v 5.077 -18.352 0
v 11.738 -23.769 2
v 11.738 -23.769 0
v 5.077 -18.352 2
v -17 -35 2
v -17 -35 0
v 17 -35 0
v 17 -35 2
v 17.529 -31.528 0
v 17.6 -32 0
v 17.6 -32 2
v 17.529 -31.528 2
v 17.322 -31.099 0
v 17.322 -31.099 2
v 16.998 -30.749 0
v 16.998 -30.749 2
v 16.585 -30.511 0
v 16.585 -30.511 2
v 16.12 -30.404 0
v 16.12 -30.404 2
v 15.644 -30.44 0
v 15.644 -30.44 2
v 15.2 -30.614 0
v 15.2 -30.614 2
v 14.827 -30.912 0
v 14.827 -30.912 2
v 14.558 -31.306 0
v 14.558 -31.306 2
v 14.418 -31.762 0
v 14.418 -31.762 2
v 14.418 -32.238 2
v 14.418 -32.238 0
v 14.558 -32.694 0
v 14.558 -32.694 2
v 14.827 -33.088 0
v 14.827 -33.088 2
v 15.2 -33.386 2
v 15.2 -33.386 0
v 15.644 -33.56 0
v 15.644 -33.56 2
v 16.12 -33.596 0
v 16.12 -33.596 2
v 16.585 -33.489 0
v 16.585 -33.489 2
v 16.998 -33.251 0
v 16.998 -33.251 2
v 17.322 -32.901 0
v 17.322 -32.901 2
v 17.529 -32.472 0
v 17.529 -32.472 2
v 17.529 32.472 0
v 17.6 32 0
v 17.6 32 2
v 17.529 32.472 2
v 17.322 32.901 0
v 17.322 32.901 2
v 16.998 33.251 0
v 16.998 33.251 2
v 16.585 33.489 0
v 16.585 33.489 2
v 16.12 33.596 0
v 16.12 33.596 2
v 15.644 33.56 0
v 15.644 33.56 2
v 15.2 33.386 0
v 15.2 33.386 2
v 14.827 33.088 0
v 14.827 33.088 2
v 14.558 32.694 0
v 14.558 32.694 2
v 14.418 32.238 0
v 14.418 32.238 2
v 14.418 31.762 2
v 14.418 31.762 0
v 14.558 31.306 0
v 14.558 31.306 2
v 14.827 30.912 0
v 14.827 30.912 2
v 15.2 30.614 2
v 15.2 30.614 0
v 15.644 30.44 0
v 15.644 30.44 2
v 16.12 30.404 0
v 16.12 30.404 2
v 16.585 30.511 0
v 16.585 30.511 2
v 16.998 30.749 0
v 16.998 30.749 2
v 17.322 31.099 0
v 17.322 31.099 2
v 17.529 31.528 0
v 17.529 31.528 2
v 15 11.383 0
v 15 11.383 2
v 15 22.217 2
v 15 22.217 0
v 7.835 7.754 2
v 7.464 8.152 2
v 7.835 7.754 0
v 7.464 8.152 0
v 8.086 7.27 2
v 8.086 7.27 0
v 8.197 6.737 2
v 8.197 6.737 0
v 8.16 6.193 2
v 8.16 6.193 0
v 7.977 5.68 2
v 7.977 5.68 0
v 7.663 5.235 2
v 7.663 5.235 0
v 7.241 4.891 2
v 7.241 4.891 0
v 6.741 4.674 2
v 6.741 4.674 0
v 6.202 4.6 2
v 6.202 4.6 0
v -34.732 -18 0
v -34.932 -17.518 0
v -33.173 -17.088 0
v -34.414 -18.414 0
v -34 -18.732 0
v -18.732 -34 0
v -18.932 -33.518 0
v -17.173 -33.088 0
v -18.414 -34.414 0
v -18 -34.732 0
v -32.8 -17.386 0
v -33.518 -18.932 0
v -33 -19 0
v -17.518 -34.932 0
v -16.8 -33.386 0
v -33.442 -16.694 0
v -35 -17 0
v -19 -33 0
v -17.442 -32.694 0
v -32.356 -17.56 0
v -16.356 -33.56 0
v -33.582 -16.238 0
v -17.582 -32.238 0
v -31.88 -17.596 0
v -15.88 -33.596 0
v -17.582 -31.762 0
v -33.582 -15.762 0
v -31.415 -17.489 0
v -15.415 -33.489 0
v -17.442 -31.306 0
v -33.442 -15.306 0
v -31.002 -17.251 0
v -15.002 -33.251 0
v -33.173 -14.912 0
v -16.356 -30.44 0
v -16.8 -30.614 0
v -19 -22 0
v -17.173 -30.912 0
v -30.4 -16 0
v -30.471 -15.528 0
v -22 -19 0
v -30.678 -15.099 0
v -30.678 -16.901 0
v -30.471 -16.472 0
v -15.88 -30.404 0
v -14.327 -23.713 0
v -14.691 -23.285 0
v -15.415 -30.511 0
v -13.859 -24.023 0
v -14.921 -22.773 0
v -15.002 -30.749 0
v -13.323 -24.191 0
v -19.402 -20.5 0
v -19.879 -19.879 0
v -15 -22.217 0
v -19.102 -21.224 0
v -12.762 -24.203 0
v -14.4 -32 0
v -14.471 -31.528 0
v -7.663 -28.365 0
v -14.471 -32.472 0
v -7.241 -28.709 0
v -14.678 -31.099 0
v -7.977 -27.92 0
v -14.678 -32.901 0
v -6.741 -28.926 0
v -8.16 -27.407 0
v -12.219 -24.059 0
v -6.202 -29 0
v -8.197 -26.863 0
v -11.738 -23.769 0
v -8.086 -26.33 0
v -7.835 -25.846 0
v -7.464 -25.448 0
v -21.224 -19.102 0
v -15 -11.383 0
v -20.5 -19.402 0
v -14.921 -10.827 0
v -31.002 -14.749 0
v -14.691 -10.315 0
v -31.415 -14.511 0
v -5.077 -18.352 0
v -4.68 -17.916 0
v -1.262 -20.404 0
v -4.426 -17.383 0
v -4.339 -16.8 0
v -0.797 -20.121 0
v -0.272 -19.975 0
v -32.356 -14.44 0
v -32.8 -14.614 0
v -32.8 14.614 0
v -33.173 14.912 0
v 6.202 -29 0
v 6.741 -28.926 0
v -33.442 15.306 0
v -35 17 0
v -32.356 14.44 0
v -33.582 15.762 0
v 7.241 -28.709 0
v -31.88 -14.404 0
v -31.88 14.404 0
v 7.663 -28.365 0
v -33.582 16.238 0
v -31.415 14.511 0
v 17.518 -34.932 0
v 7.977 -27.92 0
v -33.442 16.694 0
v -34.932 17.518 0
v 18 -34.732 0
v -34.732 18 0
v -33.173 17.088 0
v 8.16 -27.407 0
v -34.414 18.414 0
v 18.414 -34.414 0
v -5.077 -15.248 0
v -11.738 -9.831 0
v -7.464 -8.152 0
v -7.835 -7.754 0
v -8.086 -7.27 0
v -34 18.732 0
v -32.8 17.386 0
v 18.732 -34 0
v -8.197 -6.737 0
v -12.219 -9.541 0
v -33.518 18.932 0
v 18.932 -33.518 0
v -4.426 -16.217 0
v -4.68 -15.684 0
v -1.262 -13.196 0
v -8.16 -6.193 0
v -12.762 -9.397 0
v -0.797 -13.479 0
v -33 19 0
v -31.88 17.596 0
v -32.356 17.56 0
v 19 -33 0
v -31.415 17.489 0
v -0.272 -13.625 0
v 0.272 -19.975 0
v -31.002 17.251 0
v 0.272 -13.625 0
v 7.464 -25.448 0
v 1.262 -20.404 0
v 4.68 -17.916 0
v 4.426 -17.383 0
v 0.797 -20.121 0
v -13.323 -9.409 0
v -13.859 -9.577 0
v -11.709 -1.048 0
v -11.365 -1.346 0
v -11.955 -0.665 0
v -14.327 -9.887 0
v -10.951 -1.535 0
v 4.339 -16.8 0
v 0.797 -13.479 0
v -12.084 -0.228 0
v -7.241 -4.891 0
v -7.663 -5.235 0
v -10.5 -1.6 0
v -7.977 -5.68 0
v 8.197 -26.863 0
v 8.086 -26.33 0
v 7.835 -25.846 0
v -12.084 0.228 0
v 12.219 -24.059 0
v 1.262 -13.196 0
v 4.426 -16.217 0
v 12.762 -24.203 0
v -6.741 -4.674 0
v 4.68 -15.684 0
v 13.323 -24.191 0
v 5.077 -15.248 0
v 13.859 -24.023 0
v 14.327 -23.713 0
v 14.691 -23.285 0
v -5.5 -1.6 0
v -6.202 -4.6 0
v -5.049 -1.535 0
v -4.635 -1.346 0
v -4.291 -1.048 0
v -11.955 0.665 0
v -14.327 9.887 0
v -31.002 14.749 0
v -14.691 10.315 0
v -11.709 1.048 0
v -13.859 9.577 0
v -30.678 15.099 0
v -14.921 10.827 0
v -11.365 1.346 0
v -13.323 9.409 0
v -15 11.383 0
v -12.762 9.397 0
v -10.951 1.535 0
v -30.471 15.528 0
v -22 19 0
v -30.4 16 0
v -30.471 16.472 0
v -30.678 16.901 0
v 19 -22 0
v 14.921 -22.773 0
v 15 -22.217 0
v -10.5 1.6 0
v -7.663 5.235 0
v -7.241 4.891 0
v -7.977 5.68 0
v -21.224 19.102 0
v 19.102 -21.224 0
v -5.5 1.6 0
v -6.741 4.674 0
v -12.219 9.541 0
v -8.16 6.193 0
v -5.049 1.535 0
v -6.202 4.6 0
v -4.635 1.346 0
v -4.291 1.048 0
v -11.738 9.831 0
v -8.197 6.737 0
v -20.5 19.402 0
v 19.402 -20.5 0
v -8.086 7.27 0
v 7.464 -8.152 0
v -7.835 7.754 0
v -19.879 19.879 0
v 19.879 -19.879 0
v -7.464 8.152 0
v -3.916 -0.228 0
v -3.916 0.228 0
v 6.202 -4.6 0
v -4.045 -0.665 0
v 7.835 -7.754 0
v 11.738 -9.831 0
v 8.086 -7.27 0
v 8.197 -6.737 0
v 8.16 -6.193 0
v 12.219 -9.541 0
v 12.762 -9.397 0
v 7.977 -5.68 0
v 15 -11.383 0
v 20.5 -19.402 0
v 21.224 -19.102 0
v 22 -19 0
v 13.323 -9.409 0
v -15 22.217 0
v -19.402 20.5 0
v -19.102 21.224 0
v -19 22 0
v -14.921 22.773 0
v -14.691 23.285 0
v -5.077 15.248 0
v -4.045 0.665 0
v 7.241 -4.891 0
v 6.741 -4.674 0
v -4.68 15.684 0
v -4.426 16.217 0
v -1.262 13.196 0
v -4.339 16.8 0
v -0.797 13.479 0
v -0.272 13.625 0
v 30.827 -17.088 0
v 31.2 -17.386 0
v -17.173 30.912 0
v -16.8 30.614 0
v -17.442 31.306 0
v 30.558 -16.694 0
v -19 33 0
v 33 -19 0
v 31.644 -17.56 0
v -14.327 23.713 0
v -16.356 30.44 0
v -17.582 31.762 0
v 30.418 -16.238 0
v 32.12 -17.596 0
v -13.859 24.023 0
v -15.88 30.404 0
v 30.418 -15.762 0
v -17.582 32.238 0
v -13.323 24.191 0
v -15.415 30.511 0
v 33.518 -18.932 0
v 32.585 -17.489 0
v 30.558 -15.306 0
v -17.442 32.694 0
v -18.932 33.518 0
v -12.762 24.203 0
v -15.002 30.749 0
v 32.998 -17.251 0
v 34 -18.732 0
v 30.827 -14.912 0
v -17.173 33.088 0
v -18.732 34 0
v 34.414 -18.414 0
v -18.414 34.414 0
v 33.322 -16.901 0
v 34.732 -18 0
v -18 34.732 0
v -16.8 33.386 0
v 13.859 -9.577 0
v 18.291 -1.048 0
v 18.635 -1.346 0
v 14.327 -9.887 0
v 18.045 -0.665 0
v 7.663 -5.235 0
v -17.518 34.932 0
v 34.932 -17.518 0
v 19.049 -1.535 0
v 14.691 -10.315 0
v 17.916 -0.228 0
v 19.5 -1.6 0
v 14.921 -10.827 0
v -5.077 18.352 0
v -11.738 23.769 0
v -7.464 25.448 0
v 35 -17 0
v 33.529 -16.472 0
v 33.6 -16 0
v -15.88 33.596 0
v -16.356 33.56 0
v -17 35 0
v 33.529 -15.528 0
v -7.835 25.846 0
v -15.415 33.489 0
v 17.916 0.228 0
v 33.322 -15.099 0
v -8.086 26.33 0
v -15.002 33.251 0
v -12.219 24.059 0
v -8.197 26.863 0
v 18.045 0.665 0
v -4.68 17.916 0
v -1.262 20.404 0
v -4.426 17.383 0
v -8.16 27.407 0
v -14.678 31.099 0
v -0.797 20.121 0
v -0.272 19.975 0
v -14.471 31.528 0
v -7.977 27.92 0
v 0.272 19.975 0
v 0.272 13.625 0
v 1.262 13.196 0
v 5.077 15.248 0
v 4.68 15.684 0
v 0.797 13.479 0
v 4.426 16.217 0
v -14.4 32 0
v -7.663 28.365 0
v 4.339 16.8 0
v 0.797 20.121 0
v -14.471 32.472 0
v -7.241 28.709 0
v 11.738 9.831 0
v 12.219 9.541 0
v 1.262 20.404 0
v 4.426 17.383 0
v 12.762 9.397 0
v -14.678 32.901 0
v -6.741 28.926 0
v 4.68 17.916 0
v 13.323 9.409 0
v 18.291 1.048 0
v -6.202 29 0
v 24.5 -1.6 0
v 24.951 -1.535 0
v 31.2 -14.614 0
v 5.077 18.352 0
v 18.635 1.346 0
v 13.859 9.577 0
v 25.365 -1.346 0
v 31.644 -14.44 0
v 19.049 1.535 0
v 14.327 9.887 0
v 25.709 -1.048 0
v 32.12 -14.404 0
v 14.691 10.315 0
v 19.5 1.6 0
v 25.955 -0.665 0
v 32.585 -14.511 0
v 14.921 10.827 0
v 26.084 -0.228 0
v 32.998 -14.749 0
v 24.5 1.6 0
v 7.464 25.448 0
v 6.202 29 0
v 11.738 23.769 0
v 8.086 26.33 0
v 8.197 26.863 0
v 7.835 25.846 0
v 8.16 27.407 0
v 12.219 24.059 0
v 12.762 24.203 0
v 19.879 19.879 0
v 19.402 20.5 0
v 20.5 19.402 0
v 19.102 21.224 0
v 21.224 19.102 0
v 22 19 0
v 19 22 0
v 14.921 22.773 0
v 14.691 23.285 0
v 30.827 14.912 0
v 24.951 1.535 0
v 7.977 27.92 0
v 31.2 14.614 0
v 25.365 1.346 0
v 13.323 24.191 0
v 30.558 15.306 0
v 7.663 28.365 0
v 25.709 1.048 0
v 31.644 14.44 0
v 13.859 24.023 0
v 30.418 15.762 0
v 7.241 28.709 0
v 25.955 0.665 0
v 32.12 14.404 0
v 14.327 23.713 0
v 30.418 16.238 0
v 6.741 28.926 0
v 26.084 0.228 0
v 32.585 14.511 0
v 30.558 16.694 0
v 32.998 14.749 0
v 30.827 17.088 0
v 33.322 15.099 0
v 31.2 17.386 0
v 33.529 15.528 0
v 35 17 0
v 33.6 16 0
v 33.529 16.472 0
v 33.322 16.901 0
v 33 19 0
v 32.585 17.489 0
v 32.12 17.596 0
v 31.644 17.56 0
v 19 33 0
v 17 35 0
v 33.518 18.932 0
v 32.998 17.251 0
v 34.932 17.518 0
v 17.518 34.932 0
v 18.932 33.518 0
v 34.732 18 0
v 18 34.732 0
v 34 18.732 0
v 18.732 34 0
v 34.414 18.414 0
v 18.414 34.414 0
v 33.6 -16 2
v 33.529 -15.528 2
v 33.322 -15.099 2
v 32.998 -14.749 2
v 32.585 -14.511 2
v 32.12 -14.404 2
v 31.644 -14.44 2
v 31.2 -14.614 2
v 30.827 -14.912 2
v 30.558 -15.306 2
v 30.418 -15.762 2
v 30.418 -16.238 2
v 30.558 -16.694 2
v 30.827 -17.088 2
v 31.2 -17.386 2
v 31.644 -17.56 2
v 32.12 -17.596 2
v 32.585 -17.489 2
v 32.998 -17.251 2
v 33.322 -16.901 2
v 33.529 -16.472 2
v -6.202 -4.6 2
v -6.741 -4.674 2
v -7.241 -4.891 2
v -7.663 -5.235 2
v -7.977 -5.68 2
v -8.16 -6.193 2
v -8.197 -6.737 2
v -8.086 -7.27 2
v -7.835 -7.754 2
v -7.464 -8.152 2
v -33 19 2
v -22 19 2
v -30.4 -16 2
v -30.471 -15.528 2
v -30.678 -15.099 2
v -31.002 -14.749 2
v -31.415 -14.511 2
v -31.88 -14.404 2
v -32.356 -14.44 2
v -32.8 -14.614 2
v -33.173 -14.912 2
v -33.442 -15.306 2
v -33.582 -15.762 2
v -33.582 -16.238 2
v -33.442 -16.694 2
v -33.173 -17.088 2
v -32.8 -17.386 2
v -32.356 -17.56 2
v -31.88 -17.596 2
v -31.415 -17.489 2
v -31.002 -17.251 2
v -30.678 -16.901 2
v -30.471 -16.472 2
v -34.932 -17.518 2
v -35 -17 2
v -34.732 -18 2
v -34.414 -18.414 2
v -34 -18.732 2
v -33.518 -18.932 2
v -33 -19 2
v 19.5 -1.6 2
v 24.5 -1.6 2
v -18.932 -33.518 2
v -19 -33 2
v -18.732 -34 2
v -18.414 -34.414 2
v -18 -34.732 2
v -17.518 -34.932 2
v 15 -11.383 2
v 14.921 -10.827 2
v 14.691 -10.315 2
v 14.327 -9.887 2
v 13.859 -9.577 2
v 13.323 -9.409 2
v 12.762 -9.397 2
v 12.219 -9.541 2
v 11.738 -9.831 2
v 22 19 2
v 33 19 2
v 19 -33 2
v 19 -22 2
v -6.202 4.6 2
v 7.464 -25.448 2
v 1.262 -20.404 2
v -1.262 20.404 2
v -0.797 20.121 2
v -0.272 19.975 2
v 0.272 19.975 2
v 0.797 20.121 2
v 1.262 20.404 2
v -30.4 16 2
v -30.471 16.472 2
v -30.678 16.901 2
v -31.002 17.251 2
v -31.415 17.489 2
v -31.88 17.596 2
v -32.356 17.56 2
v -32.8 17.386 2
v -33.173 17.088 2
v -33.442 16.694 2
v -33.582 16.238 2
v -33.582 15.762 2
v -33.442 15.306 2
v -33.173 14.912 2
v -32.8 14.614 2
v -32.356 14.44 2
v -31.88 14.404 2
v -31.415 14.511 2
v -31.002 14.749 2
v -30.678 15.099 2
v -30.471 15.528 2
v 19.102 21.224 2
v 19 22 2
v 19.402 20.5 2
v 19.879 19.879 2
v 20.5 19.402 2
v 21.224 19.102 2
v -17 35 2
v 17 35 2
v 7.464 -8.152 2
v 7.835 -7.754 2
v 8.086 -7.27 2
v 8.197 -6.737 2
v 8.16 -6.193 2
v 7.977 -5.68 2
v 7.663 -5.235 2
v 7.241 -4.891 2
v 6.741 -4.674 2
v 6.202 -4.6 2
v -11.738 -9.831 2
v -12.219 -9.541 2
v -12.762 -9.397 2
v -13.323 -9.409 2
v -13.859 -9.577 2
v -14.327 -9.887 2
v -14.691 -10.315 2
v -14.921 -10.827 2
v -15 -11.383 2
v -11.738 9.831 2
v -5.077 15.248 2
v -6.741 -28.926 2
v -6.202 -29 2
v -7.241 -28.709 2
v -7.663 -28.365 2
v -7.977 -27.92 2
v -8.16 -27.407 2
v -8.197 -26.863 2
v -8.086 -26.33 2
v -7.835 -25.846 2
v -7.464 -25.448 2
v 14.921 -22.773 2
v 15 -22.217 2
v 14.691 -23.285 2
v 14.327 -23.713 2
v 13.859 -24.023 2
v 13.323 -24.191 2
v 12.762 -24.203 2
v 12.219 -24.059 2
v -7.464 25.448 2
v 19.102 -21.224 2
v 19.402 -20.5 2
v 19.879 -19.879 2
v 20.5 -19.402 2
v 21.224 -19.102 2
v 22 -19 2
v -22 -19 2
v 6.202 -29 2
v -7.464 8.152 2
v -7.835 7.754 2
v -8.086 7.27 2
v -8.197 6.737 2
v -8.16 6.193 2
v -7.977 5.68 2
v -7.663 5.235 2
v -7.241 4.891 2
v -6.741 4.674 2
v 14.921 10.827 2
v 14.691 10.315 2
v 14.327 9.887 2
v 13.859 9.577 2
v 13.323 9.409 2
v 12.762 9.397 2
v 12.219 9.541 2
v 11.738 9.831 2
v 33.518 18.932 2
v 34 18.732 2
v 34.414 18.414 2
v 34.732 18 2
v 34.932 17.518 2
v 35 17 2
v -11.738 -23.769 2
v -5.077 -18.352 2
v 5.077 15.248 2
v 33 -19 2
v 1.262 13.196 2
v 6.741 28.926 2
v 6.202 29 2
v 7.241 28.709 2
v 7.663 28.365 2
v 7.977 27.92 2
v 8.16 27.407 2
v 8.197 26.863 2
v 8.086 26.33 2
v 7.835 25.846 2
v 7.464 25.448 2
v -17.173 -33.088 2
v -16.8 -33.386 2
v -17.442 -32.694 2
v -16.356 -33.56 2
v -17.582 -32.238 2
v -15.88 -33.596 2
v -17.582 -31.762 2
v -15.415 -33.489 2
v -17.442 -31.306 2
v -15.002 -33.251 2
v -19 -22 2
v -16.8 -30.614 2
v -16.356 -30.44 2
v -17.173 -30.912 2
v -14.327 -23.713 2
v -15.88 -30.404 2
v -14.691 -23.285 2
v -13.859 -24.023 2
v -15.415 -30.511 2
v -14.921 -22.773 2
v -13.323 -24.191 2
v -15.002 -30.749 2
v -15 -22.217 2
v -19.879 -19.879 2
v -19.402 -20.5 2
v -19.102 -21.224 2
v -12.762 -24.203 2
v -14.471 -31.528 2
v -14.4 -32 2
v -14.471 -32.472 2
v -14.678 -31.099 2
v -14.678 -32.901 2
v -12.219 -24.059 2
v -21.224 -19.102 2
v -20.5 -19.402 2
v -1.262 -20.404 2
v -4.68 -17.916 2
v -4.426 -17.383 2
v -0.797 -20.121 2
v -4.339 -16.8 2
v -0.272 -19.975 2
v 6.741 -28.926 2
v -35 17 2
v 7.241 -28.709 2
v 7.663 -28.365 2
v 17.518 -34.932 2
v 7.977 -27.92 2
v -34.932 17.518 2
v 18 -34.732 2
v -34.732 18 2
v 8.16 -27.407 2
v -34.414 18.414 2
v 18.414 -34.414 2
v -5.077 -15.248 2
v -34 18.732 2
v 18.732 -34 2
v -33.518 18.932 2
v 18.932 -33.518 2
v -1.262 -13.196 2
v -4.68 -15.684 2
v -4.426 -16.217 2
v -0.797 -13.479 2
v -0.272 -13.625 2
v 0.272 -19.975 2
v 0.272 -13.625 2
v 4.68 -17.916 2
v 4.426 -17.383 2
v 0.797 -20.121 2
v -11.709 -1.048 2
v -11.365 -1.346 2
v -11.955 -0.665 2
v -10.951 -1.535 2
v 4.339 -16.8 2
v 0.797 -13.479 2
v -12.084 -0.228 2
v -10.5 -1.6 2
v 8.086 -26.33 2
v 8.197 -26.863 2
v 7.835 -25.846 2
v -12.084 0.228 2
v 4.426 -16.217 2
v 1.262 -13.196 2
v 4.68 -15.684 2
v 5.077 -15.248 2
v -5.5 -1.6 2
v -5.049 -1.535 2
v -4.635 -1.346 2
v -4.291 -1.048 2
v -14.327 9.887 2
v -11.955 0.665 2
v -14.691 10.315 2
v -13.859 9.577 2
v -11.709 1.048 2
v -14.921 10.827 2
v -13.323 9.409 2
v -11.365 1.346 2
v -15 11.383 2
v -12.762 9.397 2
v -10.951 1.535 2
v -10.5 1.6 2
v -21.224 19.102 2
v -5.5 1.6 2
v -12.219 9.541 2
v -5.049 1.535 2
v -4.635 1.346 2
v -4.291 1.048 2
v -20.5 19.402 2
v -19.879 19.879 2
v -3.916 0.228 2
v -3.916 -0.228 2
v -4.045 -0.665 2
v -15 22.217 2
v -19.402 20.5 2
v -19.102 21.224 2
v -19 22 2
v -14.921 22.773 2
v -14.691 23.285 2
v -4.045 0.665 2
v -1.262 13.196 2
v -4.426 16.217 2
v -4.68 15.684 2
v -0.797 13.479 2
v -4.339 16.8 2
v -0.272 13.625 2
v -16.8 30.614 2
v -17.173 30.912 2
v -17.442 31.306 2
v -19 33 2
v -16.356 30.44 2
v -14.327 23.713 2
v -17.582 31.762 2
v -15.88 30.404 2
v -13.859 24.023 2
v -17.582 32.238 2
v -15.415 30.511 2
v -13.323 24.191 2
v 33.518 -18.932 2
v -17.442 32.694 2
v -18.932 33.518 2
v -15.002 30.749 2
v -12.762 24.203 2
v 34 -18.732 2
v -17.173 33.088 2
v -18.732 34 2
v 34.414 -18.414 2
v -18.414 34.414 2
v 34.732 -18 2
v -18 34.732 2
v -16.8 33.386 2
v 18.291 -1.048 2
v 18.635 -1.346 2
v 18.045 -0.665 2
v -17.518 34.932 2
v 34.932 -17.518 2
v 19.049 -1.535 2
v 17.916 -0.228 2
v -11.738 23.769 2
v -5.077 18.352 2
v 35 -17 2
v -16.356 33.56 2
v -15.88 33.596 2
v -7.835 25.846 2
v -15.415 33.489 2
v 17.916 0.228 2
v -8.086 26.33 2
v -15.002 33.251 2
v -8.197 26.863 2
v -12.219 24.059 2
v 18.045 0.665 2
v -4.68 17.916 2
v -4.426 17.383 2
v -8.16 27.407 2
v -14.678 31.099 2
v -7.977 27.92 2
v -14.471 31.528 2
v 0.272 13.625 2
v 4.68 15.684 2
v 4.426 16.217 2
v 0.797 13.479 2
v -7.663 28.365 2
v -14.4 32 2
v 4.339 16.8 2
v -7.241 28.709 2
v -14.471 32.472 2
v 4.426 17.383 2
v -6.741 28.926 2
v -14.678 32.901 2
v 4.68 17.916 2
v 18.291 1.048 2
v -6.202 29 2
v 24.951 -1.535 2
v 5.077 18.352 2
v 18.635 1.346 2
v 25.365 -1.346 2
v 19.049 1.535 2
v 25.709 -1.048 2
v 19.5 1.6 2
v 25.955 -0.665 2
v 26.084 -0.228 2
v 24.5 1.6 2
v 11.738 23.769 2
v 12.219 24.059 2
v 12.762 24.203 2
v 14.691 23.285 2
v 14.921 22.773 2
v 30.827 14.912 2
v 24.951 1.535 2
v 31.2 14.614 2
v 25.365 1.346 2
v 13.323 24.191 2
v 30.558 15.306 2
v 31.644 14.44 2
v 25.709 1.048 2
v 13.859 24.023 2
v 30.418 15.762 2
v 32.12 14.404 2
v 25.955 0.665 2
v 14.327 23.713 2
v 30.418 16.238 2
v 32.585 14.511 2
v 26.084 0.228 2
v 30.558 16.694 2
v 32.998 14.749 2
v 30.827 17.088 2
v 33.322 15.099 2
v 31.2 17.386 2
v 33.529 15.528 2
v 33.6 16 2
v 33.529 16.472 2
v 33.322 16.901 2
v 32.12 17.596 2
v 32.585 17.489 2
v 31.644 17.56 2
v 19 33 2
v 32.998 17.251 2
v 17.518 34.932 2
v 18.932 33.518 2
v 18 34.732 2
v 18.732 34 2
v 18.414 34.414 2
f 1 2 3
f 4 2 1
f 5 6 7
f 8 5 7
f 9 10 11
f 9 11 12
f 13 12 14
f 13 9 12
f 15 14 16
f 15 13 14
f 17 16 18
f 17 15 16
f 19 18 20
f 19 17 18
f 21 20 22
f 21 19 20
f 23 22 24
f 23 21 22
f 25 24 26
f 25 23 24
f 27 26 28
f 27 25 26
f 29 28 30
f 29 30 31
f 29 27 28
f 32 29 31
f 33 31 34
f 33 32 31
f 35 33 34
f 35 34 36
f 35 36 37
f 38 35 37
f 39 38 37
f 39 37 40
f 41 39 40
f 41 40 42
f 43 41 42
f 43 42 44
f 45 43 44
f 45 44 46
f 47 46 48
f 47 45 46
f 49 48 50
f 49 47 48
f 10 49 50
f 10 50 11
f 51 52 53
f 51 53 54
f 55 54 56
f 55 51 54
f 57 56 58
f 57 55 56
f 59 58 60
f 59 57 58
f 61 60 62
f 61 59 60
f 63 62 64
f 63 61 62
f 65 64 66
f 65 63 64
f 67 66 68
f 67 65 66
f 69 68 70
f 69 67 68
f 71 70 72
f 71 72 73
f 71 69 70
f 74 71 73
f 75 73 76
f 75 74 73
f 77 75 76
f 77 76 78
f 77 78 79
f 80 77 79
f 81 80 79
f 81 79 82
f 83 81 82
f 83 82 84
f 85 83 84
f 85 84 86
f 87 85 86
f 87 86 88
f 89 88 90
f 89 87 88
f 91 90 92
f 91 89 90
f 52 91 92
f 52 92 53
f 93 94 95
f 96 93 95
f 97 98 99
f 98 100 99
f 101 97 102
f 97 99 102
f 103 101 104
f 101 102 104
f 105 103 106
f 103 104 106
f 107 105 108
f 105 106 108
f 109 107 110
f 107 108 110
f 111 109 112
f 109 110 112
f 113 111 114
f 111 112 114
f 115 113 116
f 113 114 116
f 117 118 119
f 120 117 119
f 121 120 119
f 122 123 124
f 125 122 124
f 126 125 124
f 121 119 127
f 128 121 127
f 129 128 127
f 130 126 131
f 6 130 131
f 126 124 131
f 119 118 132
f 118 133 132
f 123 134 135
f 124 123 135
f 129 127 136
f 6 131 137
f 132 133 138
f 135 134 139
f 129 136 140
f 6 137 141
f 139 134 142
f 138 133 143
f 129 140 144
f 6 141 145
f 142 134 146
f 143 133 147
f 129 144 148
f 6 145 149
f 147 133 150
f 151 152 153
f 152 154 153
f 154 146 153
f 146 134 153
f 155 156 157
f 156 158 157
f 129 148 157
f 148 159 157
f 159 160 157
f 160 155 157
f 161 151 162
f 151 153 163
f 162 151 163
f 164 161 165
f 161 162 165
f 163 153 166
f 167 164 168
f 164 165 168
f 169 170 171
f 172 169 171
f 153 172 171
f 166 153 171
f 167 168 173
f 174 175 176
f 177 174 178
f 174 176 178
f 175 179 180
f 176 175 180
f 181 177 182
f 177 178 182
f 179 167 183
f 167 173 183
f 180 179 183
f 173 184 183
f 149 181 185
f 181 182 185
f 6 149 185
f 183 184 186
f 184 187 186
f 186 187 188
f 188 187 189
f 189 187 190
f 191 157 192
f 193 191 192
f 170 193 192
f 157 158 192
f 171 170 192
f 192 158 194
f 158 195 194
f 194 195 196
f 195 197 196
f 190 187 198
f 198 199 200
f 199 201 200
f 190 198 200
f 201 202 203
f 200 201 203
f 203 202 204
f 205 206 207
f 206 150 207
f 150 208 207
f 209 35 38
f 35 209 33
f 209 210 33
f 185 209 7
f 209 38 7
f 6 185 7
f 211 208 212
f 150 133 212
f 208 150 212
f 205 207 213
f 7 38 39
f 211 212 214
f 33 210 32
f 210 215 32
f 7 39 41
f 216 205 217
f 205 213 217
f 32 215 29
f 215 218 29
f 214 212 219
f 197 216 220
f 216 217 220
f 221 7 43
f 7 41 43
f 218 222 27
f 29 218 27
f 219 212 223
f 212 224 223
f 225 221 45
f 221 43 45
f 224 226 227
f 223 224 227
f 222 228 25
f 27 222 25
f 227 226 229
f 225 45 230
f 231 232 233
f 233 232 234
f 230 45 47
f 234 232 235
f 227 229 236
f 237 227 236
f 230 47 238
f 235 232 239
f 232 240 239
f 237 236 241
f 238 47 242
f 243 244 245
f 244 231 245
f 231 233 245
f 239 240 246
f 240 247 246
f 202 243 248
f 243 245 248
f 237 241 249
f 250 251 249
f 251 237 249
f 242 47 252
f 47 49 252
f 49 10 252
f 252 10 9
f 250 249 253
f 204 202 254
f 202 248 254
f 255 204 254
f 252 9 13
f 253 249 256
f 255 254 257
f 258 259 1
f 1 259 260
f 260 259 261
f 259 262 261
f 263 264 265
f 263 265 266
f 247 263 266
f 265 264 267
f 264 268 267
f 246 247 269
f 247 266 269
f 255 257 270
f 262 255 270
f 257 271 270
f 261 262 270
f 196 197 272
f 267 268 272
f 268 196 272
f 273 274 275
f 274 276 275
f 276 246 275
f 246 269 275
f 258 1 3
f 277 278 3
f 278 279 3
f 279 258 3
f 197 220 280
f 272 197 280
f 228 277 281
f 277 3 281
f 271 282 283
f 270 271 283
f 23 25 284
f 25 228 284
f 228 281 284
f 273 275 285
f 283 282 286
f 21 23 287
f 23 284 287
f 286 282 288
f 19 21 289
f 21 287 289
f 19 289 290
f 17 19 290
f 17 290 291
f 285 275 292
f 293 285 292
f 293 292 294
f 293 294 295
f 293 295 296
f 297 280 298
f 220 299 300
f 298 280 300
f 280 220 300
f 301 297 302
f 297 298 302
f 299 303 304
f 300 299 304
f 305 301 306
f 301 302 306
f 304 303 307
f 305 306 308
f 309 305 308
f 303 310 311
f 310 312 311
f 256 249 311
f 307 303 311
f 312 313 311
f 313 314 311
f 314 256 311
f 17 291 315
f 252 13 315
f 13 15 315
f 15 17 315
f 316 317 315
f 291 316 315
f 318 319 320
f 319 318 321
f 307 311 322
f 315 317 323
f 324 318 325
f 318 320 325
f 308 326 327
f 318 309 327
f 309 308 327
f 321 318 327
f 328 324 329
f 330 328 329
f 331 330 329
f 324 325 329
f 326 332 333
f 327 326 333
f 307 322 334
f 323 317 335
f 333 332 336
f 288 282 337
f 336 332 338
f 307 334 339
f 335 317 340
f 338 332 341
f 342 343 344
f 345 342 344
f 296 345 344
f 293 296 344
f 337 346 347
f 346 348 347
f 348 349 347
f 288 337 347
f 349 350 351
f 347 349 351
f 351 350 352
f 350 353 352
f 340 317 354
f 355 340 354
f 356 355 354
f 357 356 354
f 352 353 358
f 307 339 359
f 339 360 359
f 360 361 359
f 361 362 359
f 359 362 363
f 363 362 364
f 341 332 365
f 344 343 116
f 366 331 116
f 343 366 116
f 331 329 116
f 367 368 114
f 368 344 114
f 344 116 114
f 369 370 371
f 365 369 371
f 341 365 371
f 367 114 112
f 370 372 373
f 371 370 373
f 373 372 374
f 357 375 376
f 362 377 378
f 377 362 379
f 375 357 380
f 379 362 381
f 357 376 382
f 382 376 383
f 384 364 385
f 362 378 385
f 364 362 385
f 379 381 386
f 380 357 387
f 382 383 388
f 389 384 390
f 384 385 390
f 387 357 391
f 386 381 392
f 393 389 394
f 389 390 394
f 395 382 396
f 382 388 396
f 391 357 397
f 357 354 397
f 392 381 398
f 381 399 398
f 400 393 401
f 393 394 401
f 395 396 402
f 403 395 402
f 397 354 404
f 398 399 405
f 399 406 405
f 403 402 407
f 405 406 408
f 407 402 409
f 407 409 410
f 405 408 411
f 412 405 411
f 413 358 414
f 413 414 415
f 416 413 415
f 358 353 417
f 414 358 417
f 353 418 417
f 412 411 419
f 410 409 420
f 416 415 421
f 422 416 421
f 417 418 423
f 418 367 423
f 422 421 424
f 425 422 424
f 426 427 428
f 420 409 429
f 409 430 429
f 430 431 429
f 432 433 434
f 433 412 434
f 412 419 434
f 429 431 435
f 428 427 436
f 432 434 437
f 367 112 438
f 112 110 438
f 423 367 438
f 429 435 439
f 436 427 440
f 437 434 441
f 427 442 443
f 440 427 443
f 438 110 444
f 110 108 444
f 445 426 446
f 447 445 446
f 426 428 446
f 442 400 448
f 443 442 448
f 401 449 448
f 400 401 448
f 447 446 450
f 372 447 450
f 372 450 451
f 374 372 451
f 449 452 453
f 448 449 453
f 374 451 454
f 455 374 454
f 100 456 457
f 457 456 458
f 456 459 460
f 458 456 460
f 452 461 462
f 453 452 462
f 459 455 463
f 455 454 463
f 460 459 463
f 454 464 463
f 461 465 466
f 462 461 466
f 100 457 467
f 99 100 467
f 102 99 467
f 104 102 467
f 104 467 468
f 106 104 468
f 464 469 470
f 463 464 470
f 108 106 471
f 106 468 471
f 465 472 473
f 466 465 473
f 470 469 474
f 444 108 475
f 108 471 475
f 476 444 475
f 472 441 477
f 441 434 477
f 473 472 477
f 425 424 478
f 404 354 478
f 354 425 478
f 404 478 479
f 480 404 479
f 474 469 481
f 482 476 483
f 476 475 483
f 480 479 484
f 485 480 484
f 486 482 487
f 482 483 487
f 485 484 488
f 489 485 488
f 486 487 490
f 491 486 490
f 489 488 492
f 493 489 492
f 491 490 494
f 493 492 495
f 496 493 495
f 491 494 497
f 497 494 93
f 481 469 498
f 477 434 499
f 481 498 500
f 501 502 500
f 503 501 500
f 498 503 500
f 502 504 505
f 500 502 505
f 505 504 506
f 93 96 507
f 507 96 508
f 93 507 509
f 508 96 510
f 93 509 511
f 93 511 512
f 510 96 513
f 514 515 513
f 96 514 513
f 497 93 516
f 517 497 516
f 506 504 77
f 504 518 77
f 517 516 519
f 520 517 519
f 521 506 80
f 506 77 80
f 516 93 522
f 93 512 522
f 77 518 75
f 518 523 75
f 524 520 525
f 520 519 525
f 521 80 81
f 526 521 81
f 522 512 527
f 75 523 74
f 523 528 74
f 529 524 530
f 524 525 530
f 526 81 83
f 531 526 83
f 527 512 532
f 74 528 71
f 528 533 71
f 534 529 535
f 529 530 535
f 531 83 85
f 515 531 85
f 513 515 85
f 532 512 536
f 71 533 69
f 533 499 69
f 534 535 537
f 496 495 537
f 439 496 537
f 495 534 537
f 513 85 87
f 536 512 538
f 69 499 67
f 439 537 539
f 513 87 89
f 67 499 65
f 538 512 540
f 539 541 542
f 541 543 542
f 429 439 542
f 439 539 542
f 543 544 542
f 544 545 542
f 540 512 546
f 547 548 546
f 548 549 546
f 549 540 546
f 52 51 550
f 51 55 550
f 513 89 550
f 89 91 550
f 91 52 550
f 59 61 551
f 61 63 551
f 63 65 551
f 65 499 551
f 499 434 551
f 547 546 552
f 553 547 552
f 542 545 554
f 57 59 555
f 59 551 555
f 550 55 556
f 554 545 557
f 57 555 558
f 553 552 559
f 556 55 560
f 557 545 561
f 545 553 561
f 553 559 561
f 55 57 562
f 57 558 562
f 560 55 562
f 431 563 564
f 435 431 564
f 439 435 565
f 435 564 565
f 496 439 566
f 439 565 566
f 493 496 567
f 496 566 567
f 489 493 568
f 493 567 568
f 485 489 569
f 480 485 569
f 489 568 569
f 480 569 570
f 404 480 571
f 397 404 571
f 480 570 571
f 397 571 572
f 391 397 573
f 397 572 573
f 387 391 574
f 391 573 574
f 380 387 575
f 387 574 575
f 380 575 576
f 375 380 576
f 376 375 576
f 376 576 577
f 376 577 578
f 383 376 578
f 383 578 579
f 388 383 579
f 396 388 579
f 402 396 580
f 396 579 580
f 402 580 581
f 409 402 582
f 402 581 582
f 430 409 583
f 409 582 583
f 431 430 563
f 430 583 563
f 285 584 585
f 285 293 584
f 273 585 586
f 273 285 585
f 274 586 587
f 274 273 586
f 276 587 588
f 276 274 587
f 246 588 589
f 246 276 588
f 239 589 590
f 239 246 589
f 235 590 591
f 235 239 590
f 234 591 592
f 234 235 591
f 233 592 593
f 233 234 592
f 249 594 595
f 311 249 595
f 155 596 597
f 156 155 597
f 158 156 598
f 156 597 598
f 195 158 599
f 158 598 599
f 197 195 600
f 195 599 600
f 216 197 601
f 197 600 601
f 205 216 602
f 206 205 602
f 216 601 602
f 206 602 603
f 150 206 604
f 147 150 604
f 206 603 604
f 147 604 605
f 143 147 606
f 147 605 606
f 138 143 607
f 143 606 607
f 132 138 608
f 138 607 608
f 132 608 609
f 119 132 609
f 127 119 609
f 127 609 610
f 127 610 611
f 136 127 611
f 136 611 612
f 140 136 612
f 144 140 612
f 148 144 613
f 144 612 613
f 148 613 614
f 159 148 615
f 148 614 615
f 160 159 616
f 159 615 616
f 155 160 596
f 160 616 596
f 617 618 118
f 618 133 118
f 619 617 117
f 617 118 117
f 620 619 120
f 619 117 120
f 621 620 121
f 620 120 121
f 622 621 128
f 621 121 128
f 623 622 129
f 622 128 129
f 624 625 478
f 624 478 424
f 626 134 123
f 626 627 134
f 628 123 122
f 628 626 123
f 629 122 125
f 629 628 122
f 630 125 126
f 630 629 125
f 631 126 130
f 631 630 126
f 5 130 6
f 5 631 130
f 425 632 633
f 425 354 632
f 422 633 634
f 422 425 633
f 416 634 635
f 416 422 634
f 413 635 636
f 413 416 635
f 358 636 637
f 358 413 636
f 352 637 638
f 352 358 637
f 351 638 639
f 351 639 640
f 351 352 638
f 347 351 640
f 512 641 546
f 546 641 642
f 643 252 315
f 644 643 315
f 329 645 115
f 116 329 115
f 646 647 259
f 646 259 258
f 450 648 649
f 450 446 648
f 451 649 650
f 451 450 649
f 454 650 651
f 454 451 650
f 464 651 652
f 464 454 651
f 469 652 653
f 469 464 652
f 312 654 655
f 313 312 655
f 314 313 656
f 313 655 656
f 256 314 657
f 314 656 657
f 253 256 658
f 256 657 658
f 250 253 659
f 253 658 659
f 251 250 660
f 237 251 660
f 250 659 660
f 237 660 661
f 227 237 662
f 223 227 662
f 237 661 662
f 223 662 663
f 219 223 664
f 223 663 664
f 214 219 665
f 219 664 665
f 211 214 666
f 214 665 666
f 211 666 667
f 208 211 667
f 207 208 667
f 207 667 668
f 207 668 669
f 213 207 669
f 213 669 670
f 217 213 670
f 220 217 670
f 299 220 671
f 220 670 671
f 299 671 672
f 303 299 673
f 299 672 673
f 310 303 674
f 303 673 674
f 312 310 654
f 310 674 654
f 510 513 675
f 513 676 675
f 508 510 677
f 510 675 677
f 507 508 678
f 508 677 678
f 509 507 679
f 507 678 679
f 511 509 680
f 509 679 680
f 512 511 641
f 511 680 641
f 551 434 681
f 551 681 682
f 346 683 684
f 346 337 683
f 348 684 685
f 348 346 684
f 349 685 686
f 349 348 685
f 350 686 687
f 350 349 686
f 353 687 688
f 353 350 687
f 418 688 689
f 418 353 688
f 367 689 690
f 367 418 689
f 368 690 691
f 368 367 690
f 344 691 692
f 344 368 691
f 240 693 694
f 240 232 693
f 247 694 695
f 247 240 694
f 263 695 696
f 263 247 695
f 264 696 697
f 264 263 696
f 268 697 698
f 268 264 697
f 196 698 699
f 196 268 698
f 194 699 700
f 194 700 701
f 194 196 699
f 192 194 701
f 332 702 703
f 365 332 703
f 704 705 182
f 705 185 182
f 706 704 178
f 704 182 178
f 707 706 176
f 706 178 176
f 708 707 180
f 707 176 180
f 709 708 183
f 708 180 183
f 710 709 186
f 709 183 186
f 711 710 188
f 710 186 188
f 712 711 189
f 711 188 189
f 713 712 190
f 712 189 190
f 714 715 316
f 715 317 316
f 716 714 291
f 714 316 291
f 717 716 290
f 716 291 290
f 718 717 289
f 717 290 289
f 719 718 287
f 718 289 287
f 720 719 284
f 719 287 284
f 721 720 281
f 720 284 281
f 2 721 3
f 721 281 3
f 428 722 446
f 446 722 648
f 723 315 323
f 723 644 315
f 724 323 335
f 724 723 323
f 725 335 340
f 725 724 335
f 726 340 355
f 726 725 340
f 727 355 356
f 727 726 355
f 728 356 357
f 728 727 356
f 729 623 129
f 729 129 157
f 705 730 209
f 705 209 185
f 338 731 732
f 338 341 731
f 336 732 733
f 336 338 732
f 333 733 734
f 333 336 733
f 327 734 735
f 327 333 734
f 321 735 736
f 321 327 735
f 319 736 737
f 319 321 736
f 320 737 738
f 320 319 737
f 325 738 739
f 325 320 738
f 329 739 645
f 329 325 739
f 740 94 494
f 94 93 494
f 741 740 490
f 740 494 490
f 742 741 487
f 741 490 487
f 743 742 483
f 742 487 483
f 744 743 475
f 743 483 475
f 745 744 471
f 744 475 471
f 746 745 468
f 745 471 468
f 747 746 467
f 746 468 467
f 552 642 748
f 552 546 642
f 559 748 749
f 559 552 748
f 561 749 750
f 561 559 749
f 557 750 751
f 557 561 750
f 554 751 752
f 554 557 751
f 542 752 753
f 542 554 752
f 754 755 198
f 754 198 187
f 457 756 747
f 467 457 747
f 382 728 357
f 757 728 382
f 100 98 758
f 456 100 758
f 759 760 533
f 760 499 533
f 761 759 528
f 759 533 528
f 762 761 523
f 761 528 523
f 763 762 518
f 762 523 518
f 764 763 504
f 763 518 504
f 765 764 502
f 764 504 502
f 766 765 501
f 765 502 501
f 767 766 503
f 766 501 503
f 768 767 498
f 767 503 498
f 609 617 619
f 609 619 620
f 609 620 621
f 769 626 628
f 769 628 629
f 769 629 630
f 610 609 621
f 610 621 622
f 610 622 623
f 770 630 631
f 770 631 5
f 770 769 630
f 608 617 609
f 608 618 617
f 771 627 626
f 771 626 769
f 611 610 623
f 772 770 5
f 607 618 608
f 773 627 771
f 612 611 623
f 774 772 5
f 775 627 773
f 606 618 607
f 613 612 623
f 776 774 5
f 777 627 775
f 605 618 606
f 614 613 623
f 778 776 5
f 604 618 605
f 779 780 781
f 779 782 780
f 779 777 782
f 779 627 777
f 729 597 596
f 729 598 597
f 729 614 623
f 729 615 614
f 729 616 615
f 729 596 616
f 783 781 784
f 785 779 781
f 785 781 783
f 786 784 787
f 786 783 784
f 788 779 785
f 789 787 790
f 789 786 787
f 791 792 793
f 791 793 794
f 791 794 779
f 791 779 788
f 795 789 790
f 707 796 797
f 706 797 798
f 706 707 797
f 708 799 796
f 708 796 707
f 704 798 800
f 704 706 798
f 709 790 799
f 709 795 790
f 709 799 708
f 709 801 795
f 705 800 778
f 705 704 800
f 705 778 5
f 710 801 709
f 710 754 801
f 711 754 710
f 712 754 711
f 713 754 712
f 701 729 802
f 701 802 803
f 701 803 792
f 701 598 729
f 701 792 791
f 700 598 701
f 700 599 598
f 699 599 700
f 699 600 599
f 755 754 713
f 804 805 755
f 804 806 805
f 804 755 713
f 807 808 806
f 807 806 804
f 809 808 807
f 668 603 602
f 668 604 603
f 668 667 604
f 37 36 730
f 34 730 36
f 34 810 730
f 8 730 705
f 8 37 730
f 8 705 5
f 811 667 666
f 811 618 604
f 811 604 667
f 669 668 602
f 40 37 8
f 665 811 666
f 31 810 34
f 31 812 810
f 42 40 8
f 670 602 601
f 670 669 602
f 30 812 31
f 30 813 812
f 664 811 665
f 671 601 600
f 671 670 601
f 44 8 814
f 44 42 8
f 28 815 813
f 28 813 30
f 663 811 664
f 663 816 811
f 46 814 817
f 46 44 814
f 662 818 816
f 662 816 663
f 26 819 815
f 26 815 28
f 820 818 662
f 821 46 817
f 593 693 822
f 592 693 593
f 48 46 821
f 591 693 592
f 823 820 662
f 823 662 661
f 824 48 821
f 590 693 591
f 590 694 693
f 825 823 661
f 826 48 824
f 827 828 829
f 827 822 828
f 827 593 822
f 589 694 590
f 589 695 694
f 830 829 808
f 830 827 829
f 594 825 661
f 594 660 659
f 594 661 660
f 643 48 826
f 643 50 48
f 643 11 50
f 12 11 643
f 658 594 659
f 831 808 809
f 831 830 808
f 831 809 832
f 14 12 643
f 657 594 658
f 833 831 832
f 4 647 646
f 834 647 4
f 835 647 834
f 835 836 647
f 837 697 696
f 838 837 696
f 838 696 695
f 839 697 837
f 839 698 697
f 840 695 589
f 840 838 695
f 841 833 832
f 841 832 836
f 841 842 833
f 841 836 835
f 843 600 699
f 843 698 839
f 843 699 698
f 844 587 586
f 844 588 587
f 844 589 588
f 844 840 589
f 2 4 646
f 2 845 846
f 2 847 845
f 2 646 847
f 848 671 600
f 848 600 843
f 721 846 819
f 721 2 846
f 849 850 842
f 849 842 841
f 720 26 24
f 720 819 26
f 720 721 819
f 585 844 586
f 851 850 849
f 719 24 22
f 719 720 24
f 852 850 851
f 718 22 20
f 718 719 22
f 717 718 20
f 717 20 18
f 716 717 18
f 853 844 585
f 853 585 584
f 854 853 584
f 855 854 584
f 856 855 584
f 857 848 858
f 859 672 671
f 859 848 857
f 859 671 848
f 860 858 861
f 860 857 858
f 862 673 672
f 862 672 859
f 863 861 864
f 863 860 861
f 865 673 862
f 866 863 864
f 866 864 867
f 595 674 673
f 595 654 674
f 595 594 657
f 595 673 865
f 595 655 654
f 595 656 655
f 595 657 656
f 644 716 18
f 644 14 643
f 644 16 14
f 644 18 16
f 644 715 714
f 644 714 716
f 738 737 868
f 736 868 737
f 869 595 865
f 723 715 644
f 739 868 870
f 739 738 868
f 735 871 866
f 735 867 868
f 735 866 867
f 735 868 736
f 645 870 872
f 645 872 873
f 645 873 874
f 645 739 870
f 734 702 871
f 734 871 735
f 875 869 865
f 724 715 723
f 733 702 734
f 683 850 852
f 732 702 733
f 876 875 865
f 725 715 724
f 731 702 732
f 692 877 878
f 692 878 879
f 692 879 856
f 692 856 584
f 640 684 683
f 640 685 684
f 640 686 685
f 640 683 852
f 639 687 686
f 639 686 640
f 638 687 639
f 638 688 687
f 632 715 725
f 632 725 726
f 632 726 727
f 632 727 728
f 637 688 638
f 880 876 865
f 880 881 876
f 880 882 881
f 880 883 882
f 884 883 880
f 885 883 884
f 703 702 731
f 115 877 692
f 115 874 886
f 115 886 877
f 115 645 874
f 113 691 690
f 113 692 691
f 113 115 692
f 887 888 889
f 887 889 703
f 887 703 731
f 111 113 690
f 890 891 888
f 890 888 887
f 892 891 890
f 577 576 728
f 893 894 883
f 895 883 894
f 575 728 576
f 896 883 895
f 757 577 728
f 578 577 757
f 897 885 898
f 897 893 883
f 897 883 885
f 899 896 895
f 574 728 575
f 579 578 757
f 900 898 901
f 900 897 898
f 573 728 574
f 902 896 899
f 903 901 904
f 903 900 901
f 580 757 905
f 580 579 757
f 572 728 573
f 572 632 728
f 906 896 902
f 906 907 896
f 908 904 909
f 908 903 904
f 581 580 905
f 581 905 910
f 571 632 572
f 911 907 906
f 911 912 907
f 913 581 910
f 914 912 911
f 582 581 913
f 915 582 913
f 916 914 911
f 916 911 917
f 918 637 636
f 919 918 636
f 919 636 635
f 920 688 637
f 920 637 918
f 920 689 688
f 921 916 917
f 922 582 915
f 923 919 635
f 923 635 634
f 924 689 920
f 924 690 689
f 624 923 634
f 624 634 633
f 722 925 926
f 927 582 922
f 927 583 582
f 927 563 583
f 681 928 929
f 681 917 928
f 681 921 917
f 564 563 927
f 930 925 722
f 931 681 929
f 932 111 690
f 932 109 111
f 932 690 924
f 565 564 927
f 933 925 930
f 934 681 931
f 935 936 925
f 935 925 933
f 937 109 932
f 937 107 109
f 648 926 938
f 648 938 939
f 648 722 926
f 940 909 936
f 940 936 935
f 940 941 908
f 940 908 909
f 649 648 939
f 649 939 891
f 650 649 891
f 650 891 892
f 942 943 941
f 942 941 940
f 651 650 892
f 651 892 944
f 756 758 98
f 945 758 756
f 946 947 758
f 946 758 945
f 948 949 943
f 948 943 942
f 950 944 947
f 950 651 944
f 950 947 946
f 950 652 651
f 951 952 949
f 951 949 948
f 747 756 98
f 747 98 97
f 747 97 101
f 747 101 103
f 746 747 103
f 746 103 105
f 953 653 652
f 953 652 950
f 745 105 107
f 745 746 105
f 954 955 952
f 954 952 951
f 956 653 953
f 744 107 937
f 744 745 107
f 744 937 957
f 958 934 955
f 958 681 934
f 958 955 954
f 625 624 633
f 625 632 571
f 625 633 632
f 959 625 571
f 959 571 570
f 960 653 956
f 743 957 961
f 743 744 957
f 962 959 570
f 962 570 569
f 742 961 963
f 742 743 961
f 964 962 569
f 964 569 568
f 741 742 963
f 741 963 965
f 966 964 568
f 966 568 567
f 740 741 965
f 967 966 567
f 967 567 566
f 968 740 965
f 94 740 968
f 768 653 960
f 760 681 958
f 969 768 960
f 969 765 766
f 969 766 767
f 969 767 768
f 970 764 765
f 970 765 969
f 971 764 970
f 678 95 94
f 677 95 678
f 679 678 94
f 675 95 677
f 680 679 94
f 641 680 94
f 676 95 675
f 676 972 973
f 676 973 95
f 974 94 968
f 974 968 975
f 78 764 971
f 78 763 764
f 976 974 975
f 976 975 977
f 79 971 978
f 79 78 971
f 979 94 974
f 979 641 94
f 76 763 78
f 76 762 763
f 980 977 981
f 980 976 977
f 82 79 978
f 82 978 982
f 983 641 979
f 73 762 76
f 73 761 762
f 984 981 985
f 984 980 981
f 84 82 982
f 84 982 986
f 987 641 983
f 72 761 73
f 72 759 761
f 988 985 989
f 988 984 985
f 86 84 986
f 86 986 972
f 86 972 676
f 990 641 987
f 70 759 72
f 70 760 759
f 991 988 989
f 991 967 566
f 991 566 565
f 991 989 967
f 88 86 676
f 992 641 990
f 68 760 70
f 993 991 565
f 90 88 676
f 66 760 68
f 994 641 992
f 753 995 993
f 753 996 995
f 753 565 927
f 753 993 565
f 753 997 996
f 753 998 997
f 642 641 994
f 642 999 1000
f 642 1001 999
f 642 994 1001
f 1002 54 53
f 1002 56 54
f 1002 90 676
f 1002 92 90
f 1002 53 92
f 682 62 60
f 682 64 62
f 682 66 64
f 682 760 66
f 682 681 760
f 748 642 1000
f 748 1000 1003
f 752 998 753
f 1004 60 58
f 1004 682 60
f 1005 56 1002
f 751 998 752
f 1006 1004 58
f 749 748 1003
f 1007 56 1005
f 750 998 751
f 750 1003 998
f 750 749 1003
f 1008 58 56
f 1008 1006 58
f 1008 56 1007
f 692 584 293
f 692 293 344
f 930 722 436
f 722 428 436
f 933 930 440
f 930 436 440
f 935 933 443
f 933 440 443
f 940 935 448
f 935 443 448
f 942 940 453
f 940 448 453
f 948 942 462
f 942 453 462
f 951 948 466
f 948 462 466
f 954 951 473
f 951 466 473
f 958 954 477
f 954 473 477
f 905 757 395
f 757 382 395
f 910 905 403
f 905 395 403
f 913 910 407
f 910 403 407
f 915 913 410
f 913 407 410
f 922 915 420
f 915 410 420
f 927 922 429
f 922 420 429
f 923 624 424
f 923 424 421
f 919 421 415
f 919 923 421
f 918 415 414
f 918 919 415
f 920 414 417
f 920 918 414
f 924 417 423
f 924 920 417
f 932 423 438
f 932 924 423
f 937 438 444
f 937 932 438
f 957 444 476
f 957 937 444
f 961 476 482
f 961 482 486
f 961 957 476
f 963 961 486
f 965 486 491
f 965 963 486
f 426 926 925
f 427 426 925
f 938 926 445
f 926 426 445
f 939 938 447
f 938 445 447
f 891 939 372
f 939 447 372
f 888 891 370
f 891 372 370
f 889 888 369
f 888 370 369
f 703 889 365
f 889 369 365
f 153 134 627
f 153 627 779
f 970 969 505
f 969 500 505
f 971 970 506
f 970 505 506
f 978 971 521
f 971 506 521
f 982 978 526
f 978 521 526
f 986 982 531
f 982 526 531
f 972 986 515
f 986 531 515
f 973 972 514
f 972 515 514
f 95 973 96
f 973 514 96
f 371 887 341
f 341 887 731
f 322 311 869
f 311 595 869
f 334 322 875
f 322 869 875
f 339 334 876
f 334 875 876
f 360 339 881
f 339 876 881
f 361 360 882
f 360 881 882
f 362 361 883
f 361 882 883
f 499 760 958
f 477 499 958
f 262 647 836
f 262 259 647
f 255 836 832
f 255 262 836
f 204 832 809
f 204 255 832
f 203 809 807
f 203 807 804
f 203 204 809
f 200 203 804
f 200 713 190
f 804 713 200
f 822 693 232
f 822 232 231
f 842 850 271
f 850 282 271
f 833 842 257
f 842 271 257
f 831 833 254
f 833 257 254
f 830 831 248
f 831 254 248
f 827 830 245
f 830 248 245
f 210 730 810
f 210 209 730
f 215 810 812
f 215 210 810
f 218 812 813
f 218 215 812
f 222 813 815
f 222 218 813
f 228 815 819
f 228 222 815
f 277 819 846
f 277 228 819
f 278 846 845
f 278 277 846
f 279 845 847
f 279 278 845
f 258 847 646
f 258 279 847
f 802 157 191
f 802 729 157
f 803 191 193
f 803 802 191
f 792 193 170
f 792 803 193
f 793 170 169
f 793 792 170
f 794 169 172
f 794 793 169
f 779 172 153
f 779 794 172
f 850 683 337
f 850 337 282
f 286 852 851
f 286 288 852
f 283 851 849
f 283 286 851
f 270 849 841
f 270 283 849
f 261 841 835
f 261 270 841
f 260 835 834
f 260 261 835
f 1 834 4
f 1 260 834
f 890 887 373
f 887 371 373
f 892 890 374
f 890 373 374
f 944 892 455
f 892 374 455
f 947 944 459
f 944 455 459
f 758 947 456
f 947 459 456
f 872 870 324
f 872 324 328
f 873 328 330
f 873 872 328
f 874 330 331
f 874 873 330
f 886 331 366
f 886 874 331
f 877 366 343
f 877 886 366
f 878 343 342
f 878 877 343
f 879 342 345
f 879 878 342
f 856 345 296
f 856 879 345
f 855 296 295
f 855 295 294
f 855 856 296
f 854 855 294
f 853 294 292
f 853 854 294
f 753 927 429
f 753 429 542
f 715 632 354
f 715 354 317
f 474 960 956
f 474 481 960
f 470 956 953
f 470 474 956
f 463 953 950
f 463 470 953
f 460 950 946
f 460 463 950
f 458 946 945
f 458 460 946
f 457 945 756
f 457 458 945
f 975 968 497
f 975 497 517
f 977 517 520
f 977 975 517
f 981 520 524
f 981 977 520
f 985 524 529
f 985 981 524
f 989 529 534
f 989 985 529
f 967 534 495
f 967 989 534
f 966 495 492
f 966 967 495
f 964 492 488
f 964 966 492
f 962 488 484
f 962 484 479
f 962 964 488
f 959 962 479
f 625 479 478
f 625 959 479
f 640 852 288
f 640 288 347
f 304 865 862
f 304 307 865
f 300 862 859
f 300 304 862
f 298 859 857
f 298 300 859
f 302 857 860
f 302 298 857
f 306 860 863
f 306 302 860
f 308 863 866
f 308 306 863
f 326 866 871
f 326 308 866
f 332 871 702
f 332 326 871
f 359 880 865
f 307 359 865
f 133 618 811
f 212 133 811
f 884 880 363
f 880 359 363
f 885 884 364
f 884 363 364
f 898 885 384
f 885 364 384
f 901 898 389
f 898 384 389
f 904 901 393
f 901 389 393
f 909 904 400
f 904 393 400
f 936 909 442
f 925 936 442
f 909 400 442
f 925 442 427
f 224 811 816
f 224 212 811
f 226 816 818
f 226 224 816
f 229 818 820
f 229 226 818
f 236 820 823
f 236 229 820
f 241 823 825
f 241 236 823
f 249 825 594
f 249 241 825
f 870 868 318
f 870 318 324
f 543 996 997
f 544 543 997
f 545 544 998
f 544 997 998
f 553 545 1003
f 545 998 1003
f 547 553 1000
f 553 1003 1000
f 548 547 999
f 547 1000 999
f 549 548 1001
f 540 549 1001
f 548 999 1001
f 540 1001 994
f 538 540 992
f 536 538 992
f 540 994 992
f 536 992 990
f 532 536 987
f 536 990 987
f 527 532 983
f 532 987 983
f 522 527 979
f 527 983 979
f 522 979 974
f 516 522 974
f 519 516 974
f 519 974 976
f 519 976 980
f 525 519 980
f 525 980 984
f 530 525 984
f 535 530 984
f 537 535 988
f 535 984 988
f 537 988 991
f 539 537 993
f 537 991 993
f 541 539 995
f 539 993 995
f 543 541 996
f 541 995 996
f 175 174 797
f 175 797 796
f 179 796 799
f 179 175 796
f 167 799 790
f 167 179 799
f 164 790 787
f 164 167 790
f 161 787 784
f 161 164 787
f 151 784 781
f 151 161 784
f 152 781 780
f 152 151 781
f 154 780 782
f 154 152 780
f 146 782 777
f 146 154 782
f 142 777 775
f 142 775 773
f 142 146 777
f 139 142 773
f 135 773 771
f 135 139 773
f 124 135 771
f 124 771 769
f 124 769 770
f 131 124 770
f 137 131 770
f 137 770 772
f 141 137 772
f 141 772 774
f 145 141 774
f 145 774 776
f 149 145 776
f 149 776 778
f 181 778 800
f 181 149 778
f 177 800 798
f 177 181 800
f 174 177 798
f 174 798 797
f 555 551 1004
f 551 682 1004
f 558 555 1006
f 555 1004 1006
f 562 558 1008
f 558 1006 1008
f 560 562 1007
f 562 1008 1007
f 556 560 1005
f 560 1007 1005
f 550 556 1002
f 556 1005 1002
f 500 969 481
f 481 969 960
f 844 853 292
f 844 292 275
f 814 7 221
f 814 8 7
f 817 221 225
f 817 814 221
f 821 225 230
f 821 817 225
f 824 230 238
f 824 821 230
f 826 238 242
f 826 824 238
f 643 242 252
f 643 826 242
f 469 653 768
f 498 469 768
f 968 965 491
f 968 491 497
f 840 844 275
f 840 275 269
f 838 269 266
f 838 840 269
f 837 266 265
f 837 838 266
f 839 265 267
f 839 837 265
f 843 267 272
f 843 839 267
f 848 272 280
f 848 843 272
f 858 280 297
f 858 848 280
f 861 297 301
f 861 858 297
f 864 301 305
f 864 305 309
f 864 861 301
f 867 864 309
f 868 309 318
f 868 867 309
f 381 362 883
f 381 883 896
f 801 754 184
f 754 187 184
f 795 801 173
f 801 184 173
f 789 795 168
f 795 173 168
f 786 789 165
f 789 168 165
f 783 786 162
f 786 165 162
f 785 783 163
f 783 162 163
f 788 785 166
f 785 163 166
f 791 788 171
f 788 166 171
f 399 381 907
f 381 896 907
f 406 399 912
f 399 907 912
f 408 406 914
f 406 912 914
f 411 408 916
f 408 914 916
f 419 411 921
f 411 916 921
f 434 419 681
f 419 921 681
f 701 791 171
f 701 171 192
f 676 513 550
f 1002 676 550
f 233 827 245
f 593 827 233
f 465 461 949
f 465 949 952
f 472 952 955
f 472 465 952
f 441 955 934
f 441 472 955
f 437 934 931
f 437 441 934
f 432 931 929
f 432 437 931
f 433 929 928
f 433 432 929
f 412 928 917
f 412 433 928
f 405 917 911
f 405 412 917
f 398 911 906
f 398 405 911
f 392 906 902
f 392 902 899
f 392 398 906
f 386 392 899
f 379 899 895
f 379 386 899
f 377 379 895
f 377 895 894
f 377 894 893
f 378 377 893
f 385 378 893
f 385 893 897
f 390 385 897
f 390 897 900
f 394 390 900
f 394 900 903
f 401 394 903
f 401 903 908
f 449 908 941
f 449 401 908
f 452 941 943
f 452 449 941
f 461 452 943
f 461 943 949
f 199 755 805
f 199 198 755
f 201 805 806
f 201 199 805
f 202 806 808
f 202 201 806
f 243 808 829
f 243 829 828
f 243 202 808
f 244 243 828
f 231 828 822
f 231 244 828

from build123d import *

# Parameters (mm, degrees)
SKETCH_1_W          = 38
SKETCH_1_H          = 70
SKETCH_1_R          = 1.6
EXTRUDE_1_DEPTH     = 2
FILLET_1_R          = 2
SKETCH_3_W          = 70
SKETCH_3_H          = 38
SKETCH_3_R          = 1.6
EXTRUDE_2_DEPTH     = 2
CUT_EXTRUDE_2_DEPTH = 2
FILLET_3_R          = 2
FILLET_4_R          = 3
CUT_EXTRUDE_3_DEPTH = 2
FILLET_5_R          = 2


with BuildPart() as part:
    # 草图1 → 凸台-拉伸1 (new body)
    with BuildSketch(Plane.XY):
        Rectangle(SKETCH_1_W, SKETCH_1_H)
        with Locations((16, 32)):
            Circle(SKETCH_1_R, mode=Mode.SUBTRACT)
        with Locations((-16, 32)):
            Circle(SKETCH_1_R, mode=Mode.SUBTRACT)
        with Locations((-16, -32)):
            Circle(SKETCH_1_R, mode=Mode.SUBTRACT)
        with Locations((16, -32)):
            Circle(SKETCH_1_R, mode=Mode.SUBTRACT)
    extrude(amount=EXTRUDE_1_DEPTH)

    # 圆角1
    fillet_1_edges = [part.edges().sort_by_distance(p)[0] for p in [
        (19, -35, 1),
        (-19, -35, 1),
        (-19, 35, 1),
        (19, 35, 1),
    ]]
    fillet(fillet_1_edges, radius=FILLET_1_R)

    # 草图3 → 凸台-拉伸2 (add)
    with BuildSketch(Plane.XY.offset(2)):
        Rectangle(SKETCH_3_W, SKETCH_3_H)
        with Locations((32, 16)):
            Circle(SKETCH_3_R, mode=Mode.SUBTRACT)
        with Locations((-32, 16)):
            Circle(SKETCH_3_R, mode=Mode.SUBTRACT)
        with Locations((-32, -16)):
            Circle(SKETCH_3_R, mode=Mode.SUBTRACT)
        with Locations((32, -16)):
            Circle(SKETCH_3_R, mode=Mode.SUBTRACT)
    extrude(amount=-EXTRUDE_2_DEPTH)

    # 草图4 → 切除-拉伸2 (cut)
    with BuildSketch(Plane.XY.offset(2)):
        with BuildLine():
            Line((-10.5, 1.6), (-5.5, 1.6))
            ThreePointArc((-5.5, 1.6), (-3.9, 0), (-5.5, -1.6))
            Line((-5.5, -1.6), (-10.5, -1.6))
            ThreePointArc((-10.5, -1.6), (-12.1, 0), (-10.5, 1.6))
        make_face()
        with BuildLine():
            Line((19.5, 1.6), (24.5, 1.6))
            ThreePointArc((24.5, 1.6), (26.1, 0), (24.5, -1.6))
            Line((24.5, -1.6), (19.5, -1.6))
            ThreePointArc((19.5, -1.6), (17.9, 0), (19.5, 1.6))
        make_face()
    extrude(amount=-CUT_EXTRUDE_2_DEPTH, mode=Mode.SUBTRACT)

    # 圆角3
    fillet_3_edges = [part.edges().sort_by_distance(p)[0] for p in [
        (35, -19, 1),
        (-35, 19, 1),
        (35, 19, 1),
        (-35, -19, 1),
    ]]
    fillet(fillet_3_edges, radius=FILLET_3_R)

    # 圆角4
    fillet_4_edges = [part.edges().sort_by_distance(p)[0] for p in [
        (-19, 19, 1),
        (-19, -19, 1),
        (19, -19, 1),
        (19, 19, 1),
    ]]
    fillet(fillet_4_edges, radius=FILLET_4_R)

    # 草图5 → 切除-拉伸3 (cut)
    with BuildSketch(Plane.XY.offset(2)):
        Polygon((0, 14.222007672), (-11.830337301, 4.6), (11.830337301, 4.6), align=None)
        Polygon((-15, 26.422007672), (-15, 7.177992328), (-3.169662699, 16.8), align=None)
        Polygon((-11.830337301, 29), (0, 19.377992328), (11.830337301, 29), align=None)
        Polygon((15, 26.422007672), (3.169662699, 16.8), (15, 7.177992328), align=None)
    cut_extrude_3 = extrude(amount=-CUT_EXTRUDE_3_DEPTH, mode=Mode.SUBTRACT)

    # 镜向1: 切除-拉伸3 across plane
    add(cut_extrude_3.mirror(Plane.ZX), mode=Mode.SUBTRACT)

    # 圆角5
    fillet_5_edges = [part.edges().sort_by_distance(p)[0] for p in [
        (-11.830337301, 29, 1),
        (11.830337301, 29, 1),
        (0, 19.377992328, 1),
        (-3.169662699, 16.8, 1),
        (-15, 7.177992328, 1),
        (-15, 26.422007672, 1),
        (15, 26.422007672, 1),
        (15, 7.177992328, 1),
        (3.169662699, 16.8, 1),
        (0, 14.222007672, 1),
        (11.830337301, 4.6, 1),
        (-11.830337301, 4.6, 1),
        (11.830337301, -29, 1),
        (-11.830337301, -29, 1),
        (0, -19.377992328, 1),
        (-15, -7.177992328, 1),
        (-3.169662699, -16.8, 1),
        (-15, -26.422007672, 1),
        (15, -7.177992328, 1),
        (15, -26.422007672, 1),
        (3.169662699, -16.8, 1),
        (11.830337301, -4.6, 1),
        (0, -14.222007672, 1),
        (-11.830337301, -4.6, 1),
    ]]
    fillet(fillet_5_edges, radius=FILLET_5_R)


solid = part.part
